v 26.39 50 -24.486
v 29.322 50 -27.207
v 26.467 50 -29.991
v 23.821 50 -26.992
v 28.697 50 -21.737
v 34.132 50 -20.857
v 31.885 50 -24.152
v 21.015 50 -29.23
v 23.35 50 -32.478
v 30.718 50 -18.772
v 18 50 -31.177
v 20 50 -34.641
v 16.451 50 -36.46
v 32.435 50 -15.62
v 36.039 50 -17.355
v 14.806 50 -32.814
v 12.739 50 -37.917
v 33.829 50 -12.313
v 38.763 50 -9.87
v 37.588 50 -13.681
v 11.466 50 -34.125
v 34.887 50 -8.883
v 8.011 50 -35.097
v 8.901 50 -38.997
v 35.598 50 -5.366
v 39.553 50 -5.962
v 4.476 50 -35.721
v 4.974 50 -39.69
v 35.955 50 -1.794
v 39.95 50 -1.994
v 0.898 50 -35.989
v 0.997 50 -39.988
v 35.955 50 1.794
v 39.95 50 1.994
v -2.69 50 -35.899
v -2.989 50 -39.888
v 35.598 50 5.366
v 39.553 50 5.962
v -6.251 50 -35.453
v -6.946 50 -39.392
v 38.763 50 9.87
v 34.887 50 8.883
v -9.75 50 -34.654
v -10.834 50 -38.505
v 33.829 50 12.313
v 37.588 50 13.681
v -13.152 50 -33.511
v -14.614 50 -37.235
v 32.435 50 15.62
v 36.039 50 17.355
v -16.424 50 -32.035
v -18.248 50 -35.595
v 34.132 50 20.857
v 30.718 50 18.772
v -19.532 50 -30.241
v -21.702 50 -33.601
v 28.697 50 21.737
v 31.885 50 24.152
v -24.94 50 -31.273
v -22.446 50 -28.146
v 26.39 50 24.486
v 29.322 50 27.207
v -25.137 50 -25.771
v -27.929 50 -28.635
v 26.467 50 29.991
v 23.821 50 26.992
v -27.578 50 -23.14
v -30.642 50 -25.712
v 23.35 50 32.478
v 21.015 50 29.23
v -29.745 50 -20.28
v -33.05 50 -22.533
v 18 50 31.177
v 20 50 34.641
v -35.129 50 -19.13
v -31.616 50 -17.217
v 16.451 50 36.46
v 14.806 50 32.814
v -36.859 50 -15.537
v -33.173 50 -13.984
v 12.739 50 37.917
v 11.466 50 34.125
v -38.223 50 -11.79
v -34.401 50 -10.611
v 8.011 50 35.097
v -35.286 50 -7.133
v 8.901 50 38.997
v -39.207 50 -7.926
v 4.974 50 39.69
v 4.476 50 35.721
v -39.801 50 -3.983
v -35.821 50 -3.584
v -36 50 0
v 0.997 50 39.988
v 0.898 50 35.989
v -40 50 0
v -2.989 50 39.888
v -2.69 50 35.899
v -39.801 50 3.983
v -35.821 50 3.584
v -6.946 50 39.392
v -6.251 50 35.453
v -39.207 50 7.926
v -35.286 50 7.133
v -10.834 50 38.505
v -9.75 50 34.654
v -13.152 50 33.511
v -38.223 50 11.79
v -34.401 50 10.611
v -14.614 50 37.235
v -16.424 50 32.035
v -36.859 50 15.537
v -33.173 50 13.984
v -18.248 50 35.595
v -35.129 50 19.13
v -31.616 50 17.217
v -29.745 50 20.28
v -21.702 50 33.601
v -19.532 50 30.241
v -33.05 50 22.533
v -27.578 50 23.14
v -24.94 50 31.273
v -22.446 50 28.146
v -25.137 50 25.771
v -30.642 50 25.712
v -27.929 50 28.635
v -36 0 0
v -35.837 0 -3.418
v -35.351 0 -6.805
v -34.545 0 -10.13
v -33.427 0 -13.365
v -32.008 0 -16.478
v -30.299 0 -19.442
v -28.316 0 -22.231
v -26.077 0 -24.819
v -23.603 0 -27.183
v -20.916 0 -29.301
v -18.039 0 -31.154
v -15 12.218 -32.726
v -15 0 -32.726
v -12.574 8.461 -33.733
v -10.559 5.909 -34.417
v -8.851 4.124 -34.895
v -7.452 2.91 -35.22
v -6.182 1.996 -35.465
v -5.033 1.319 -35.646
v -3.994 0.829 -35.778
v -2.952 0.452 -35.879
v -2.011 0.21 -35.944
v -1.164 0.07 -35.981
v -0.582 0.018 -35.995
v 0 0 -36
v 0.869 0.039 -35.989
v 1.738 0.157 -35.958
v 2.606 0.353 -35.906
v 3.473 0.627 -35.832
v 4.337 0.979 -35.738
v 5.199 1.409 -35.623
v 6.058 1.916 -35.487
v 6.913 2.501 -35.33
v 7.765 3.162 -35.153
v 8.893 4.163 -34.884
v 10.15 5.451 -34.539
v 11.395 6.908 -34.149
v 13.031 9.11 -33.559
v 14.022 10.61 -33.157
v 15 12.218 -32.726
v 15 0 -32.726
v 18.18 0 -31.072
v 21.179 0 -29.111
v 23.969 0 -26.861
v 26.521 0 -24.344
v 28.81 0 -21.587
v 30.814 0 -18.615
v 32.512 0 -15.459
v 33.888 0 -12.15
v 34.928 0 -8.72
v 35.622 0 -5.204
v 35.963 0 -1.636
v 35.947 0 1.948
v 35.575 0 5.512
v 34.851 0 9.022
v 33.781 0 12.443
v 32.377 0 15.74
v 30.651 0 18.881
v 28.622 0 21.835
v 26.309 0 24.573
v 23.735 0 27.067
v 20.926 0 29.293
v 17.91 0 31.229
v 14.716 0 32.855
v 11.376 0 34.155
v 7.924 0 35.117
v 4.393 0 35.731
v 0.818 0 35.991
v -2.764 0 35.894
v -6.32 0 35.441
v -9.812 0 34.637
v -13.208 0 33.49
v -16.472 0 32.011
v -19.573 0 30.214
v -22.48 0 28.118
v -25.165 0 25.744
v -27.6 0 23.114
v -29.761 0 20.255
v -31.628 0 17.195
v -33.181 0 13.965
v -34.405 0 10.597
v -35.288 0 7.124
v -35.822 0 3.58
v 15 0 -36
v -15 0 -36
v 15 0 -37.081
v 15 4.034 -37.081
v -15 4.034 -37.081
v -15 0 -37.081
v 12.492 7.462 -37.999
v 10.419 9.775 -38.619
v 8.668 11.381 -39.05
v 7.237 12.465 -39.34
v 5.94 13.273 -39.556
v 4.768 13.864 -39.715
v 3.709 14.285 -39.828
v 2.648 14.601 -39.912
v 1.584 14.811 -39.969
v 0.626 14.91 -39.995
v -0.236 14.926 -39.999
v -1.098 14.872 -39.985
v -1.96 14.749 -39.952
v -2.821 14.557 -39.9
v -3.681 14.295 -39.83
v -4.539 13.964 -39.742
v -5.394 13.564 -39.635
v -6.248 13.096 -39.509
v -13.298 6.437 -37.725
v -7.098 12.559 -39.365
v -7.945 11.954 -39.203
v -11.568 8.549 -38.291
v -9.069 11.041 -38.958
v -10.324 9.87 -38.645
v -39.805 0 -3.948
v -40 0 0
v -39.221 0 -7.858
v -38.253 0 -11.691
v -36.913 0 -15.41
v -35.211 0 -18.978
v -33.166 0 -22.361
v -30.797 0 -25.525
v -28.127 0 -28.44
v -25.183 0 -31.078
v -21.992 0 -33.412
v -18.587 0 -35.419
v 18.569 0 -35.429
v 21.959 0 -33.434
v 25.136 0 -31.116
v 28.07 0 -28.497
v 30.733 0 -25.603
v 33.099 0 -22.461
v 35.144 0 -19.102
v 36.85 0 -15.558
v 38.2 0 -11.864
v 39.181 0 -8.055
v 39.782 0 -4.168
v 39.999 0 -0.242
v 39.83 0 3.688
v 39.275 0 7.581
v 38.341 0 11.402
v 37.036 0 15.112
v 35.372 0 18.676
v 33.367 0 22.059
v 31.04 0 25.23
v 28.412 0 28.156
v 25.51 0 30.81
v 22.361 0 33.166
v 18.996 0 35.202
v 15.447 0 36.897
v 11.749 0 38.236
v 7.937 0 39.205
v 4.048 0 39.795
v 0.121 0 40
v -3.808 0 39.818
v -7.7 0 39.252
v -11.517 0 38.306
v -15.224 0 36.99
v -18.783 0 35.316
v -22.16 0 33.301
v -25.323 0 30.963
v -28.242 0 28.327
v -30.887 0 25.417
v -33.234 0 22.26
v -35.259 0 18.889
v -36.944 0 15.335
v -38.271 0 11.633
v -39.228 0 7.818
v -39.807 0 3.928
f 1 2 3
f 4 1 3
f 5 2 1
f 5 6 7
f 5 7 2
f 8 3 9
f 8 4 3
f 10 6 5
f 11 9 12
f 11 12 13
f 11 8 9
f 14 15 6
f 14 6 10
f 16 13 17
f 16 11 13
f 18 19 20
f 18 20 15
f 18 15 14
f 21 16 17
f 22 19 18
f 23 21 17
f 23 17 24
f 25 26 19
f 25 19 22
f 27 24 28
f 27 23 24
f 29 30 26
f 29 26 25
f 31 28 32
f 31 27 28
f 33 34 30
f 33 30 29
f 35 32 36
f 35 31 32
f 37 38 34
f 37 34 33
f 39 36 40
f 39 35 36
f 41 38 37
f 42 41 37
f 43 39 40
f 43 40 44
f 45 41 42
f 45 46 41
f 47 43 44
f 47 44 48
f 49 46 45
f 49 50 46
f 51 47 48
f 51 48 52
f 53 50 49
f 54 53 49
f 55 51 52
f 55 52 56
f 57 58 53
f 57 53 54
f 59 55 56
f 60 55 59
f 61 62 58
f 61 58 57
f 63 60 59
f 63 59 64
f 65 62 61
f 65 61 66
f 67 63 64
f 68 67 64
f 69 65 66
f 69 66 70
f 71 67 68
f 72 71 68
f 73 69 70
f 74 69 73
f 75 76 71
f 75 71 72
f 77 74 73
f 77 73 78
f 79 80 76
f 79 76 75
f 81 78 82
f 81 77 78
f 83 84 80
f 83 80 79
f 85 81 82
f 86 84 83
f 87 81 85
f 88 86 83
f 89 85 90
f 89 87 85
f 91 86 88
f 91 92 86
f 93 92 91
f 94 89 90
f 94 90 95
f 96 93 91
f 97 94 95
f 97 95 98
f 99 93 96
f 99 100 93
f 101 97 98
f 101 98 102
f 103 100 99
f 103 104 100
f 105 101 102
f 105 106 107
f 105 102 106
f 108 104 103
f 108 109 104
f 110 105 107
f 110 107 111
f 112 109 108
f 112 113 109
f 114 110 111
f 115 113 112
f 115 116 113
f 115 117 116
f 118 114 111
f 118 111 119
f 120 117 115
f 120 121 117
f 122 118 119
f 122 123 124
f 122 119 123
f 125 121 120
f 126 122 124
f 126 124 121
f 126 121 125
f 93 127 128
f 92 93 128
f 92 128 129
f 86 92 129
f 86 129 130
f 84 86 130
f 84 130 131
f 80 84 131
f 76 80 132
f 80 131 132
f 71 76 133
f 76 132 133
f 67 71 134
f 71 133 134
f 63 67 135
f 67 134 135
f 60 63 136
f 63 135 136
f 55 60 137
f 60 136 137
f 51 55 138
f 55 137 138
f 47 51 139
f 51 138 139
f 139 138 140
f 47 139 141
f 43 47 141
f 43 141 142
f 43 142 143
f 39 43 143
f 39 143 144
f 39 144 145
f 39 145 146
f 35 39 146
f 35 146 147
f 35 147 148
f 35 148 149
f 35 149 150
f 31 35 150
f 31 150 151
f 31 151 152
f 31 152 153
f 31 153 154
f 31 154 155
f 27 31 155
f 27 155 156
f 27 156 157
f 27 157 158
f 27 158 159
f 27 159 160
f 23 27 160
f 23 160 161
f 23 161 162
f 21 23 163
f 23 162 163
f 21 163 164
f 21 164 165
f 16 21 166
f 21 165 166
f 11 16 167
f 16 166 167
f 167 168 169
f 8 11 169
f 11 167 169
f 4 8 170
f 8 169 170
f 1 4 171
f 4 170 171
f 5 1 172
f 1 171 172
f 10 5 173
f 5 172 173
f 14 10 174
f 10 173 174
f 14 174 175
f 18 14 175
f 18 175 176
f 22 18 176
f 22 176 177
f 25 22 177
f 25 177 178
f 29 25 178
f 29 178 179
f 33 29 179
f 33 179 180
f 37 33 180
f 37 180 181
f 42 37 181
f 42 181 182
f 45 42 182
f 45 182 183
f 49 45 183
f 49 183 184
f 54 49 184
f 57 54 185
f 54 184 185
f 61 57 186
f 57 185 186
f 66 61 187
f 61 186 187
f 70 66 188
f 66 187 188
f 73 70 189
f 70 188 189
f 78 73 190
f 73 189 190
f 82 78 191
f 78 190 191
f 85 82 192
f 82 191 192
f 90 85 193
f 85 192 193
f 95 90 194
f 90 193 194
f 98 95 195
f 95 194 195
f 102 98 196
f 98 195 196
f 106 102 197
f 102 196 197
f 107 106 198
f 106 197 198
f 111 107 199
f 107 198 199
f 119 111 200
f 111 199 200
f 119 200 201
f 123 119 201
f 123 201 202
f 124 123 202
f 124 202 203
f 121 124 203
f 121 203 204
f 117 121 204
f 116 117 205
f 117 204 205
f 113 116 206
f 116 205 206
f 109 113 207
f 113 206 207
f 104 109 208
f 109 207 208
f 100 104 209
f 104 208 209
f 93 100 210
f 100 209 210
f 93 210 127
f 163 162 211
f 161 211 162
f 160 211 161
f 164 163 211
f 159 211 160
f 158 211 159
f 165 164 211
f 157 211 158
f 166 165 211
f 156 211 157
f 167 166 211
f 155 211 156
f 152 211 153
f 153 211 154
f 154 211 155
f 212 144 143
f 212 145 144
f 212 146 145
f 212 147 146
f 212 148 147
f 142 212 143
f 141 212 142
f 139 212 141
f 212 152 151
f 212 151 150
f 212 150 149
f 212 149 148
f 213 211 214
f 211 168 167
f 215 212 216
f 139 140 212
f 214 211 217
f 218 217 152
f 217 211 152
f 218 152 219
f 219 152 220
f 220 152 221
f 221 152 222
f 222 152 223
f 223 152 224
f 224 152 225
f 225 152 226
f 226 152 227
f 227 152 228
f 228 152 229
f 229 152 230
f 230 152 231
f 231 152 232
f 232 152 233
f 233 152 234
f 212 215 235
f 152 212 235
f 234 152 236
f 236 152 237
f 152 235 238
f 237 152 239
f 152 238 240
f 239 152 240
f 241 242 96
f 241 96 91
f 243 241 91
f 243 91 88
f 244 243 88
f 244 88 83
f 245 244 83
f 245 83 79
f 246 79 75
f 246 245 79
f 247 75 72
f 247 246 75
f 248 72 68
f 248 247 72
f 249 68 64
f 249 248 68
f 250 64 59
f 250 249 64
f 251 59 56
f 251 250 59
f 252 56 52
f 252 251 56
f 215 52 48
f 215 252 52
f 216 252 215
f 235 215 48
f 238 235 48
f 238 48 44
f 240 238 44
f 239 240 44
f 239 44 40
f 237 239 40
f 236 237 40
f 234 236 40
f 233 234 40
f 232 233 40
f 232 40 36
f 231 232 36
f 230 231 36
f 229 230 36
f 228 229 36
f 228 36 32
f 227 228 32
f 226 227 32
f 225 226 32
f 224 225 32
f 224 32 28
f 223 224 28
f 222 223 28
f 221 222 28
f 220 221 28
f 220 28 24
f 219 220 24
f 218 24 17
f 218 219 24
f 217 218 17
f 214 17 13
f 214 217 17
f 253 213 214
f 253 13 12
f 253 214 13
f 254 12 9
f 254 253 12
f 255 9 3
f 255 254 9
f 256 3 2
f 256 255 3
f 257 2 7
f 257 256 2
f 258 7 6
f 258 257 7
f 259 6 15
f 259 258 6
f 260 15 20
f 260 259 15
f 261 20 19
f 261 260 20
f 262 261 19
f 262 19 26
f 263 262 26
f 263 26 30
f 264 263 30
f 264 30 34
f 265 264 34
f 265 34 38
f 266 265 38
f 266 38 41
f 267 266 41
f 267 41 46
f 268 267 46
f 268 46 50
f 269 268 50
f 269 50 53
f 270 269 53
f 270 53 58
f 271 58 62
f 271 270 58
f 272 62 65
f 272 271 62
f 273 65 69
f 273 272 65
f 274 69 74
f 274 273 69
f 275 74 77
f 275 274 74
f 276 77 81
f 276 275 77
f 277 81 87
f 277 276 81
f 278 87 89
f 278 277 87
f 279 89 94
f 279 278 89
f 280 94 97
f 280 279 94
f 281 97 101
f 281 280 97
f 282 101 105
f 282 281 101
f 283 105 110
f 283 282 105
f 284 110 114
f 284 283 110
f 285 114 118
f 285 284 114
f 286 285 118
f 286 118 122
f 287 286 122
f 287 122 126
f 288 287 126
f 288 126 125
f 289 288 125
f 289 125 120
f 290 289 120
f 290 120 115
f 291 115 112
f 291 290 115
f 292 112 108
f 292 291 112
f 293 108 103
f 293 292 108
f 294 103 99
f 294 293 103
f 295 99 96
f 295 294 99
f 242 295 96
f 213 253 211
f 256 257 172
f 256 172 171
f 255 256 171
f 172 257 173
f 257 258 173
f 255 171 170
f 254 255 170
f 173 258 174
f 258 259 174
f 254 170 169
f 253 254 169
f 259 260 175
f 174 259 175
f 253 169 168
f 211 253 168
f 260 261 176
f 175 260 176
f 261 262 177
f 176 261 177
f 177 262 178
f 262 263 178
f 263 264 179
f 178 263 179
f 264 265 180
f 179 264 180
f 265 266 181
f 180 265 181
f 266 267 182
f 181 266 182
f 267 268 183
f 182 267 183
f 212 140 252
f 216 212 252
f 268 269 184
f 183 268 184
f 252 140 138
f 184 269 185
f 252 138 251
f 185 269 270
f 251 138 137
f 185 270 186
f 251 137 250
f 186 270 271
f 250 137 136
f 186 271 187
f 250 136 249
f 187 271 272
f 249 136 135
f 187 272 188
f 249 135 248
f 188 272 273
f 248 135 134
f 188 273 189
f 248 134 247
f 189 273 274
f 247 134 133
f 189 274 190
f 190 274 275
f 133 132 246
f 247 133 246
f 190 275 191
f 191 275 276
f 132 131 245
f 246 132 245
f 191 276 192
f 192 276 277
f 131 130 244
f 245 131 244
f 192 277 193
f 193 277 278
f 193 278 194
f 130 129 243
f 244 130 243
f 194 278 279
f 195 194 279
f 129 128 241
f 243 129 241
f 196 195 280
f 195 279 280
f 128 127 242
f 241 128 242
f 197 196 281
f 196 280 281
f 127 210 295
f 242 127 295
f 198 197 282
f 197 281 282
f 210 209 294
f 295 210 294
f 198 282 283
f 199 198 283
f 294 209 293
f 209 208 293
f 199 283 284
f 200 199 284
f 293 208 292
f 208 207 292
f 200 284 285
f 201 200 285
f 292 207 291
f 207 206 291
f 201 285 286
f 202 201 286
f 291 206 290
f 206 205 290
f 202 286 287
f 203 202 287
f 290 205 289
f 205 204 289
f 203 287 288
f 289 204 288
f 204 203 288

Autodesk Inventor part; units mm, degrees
ref_plane "YZ Plane" through (0, 0, 0) normal (1, 0, 0) x (0, 1, 0)
ref_plane "XZ Plane" through (0, 0, 0) normal (0, 1, 0) x (-1, 0, 0)
ref_plane "XY Plane" through (0, 0, 0) normal (0, 0, 1) x (1, 0, 0)
sketch "Sketch1" plane through (0, 0, 0) normal (0, 1, 0) x (-1, 0, 0)
  circle A0 centre (0, 0) radius 40
  circle A1 centre (0, 0) radius 36
  dimension "d1" = 72
  dimension "d8" = 80
extrude "Extrusion1" add sketch "Sketch1" along normal blind 50
sketch "Sketch2" plane through (0, 0, 0) normal (1, 0, 0) x (0, 1, 0)
  line L0 (0, 40) -> (0, -40) projected
  line L1 (0, -36) -> (19.3804, -30.807)
  line L2 (0, -36) -> (20.8201, -41.5787)
  line L3 (19.3804, -30.807) -> (-2.465, -30.807)
  line L4 (-2.465, -30.807) -> (-2.465, -42.37)
  line L5 (-2.465, -42.37) -> (20.8201, -42.37)
  line L6 (20.8201, -42.37) -> (20.8201, -41.5787)
  line L7 (0, -36) -> (50, -36) projected
  point P0 (0, 0)
  dimension "d6" = 15
  dimension "d7" = 15
extrude "Extrusion2" cut sketch "Sketch2" along normal mid plane 30
properties part number "Whistle Splitter 40mmR"
